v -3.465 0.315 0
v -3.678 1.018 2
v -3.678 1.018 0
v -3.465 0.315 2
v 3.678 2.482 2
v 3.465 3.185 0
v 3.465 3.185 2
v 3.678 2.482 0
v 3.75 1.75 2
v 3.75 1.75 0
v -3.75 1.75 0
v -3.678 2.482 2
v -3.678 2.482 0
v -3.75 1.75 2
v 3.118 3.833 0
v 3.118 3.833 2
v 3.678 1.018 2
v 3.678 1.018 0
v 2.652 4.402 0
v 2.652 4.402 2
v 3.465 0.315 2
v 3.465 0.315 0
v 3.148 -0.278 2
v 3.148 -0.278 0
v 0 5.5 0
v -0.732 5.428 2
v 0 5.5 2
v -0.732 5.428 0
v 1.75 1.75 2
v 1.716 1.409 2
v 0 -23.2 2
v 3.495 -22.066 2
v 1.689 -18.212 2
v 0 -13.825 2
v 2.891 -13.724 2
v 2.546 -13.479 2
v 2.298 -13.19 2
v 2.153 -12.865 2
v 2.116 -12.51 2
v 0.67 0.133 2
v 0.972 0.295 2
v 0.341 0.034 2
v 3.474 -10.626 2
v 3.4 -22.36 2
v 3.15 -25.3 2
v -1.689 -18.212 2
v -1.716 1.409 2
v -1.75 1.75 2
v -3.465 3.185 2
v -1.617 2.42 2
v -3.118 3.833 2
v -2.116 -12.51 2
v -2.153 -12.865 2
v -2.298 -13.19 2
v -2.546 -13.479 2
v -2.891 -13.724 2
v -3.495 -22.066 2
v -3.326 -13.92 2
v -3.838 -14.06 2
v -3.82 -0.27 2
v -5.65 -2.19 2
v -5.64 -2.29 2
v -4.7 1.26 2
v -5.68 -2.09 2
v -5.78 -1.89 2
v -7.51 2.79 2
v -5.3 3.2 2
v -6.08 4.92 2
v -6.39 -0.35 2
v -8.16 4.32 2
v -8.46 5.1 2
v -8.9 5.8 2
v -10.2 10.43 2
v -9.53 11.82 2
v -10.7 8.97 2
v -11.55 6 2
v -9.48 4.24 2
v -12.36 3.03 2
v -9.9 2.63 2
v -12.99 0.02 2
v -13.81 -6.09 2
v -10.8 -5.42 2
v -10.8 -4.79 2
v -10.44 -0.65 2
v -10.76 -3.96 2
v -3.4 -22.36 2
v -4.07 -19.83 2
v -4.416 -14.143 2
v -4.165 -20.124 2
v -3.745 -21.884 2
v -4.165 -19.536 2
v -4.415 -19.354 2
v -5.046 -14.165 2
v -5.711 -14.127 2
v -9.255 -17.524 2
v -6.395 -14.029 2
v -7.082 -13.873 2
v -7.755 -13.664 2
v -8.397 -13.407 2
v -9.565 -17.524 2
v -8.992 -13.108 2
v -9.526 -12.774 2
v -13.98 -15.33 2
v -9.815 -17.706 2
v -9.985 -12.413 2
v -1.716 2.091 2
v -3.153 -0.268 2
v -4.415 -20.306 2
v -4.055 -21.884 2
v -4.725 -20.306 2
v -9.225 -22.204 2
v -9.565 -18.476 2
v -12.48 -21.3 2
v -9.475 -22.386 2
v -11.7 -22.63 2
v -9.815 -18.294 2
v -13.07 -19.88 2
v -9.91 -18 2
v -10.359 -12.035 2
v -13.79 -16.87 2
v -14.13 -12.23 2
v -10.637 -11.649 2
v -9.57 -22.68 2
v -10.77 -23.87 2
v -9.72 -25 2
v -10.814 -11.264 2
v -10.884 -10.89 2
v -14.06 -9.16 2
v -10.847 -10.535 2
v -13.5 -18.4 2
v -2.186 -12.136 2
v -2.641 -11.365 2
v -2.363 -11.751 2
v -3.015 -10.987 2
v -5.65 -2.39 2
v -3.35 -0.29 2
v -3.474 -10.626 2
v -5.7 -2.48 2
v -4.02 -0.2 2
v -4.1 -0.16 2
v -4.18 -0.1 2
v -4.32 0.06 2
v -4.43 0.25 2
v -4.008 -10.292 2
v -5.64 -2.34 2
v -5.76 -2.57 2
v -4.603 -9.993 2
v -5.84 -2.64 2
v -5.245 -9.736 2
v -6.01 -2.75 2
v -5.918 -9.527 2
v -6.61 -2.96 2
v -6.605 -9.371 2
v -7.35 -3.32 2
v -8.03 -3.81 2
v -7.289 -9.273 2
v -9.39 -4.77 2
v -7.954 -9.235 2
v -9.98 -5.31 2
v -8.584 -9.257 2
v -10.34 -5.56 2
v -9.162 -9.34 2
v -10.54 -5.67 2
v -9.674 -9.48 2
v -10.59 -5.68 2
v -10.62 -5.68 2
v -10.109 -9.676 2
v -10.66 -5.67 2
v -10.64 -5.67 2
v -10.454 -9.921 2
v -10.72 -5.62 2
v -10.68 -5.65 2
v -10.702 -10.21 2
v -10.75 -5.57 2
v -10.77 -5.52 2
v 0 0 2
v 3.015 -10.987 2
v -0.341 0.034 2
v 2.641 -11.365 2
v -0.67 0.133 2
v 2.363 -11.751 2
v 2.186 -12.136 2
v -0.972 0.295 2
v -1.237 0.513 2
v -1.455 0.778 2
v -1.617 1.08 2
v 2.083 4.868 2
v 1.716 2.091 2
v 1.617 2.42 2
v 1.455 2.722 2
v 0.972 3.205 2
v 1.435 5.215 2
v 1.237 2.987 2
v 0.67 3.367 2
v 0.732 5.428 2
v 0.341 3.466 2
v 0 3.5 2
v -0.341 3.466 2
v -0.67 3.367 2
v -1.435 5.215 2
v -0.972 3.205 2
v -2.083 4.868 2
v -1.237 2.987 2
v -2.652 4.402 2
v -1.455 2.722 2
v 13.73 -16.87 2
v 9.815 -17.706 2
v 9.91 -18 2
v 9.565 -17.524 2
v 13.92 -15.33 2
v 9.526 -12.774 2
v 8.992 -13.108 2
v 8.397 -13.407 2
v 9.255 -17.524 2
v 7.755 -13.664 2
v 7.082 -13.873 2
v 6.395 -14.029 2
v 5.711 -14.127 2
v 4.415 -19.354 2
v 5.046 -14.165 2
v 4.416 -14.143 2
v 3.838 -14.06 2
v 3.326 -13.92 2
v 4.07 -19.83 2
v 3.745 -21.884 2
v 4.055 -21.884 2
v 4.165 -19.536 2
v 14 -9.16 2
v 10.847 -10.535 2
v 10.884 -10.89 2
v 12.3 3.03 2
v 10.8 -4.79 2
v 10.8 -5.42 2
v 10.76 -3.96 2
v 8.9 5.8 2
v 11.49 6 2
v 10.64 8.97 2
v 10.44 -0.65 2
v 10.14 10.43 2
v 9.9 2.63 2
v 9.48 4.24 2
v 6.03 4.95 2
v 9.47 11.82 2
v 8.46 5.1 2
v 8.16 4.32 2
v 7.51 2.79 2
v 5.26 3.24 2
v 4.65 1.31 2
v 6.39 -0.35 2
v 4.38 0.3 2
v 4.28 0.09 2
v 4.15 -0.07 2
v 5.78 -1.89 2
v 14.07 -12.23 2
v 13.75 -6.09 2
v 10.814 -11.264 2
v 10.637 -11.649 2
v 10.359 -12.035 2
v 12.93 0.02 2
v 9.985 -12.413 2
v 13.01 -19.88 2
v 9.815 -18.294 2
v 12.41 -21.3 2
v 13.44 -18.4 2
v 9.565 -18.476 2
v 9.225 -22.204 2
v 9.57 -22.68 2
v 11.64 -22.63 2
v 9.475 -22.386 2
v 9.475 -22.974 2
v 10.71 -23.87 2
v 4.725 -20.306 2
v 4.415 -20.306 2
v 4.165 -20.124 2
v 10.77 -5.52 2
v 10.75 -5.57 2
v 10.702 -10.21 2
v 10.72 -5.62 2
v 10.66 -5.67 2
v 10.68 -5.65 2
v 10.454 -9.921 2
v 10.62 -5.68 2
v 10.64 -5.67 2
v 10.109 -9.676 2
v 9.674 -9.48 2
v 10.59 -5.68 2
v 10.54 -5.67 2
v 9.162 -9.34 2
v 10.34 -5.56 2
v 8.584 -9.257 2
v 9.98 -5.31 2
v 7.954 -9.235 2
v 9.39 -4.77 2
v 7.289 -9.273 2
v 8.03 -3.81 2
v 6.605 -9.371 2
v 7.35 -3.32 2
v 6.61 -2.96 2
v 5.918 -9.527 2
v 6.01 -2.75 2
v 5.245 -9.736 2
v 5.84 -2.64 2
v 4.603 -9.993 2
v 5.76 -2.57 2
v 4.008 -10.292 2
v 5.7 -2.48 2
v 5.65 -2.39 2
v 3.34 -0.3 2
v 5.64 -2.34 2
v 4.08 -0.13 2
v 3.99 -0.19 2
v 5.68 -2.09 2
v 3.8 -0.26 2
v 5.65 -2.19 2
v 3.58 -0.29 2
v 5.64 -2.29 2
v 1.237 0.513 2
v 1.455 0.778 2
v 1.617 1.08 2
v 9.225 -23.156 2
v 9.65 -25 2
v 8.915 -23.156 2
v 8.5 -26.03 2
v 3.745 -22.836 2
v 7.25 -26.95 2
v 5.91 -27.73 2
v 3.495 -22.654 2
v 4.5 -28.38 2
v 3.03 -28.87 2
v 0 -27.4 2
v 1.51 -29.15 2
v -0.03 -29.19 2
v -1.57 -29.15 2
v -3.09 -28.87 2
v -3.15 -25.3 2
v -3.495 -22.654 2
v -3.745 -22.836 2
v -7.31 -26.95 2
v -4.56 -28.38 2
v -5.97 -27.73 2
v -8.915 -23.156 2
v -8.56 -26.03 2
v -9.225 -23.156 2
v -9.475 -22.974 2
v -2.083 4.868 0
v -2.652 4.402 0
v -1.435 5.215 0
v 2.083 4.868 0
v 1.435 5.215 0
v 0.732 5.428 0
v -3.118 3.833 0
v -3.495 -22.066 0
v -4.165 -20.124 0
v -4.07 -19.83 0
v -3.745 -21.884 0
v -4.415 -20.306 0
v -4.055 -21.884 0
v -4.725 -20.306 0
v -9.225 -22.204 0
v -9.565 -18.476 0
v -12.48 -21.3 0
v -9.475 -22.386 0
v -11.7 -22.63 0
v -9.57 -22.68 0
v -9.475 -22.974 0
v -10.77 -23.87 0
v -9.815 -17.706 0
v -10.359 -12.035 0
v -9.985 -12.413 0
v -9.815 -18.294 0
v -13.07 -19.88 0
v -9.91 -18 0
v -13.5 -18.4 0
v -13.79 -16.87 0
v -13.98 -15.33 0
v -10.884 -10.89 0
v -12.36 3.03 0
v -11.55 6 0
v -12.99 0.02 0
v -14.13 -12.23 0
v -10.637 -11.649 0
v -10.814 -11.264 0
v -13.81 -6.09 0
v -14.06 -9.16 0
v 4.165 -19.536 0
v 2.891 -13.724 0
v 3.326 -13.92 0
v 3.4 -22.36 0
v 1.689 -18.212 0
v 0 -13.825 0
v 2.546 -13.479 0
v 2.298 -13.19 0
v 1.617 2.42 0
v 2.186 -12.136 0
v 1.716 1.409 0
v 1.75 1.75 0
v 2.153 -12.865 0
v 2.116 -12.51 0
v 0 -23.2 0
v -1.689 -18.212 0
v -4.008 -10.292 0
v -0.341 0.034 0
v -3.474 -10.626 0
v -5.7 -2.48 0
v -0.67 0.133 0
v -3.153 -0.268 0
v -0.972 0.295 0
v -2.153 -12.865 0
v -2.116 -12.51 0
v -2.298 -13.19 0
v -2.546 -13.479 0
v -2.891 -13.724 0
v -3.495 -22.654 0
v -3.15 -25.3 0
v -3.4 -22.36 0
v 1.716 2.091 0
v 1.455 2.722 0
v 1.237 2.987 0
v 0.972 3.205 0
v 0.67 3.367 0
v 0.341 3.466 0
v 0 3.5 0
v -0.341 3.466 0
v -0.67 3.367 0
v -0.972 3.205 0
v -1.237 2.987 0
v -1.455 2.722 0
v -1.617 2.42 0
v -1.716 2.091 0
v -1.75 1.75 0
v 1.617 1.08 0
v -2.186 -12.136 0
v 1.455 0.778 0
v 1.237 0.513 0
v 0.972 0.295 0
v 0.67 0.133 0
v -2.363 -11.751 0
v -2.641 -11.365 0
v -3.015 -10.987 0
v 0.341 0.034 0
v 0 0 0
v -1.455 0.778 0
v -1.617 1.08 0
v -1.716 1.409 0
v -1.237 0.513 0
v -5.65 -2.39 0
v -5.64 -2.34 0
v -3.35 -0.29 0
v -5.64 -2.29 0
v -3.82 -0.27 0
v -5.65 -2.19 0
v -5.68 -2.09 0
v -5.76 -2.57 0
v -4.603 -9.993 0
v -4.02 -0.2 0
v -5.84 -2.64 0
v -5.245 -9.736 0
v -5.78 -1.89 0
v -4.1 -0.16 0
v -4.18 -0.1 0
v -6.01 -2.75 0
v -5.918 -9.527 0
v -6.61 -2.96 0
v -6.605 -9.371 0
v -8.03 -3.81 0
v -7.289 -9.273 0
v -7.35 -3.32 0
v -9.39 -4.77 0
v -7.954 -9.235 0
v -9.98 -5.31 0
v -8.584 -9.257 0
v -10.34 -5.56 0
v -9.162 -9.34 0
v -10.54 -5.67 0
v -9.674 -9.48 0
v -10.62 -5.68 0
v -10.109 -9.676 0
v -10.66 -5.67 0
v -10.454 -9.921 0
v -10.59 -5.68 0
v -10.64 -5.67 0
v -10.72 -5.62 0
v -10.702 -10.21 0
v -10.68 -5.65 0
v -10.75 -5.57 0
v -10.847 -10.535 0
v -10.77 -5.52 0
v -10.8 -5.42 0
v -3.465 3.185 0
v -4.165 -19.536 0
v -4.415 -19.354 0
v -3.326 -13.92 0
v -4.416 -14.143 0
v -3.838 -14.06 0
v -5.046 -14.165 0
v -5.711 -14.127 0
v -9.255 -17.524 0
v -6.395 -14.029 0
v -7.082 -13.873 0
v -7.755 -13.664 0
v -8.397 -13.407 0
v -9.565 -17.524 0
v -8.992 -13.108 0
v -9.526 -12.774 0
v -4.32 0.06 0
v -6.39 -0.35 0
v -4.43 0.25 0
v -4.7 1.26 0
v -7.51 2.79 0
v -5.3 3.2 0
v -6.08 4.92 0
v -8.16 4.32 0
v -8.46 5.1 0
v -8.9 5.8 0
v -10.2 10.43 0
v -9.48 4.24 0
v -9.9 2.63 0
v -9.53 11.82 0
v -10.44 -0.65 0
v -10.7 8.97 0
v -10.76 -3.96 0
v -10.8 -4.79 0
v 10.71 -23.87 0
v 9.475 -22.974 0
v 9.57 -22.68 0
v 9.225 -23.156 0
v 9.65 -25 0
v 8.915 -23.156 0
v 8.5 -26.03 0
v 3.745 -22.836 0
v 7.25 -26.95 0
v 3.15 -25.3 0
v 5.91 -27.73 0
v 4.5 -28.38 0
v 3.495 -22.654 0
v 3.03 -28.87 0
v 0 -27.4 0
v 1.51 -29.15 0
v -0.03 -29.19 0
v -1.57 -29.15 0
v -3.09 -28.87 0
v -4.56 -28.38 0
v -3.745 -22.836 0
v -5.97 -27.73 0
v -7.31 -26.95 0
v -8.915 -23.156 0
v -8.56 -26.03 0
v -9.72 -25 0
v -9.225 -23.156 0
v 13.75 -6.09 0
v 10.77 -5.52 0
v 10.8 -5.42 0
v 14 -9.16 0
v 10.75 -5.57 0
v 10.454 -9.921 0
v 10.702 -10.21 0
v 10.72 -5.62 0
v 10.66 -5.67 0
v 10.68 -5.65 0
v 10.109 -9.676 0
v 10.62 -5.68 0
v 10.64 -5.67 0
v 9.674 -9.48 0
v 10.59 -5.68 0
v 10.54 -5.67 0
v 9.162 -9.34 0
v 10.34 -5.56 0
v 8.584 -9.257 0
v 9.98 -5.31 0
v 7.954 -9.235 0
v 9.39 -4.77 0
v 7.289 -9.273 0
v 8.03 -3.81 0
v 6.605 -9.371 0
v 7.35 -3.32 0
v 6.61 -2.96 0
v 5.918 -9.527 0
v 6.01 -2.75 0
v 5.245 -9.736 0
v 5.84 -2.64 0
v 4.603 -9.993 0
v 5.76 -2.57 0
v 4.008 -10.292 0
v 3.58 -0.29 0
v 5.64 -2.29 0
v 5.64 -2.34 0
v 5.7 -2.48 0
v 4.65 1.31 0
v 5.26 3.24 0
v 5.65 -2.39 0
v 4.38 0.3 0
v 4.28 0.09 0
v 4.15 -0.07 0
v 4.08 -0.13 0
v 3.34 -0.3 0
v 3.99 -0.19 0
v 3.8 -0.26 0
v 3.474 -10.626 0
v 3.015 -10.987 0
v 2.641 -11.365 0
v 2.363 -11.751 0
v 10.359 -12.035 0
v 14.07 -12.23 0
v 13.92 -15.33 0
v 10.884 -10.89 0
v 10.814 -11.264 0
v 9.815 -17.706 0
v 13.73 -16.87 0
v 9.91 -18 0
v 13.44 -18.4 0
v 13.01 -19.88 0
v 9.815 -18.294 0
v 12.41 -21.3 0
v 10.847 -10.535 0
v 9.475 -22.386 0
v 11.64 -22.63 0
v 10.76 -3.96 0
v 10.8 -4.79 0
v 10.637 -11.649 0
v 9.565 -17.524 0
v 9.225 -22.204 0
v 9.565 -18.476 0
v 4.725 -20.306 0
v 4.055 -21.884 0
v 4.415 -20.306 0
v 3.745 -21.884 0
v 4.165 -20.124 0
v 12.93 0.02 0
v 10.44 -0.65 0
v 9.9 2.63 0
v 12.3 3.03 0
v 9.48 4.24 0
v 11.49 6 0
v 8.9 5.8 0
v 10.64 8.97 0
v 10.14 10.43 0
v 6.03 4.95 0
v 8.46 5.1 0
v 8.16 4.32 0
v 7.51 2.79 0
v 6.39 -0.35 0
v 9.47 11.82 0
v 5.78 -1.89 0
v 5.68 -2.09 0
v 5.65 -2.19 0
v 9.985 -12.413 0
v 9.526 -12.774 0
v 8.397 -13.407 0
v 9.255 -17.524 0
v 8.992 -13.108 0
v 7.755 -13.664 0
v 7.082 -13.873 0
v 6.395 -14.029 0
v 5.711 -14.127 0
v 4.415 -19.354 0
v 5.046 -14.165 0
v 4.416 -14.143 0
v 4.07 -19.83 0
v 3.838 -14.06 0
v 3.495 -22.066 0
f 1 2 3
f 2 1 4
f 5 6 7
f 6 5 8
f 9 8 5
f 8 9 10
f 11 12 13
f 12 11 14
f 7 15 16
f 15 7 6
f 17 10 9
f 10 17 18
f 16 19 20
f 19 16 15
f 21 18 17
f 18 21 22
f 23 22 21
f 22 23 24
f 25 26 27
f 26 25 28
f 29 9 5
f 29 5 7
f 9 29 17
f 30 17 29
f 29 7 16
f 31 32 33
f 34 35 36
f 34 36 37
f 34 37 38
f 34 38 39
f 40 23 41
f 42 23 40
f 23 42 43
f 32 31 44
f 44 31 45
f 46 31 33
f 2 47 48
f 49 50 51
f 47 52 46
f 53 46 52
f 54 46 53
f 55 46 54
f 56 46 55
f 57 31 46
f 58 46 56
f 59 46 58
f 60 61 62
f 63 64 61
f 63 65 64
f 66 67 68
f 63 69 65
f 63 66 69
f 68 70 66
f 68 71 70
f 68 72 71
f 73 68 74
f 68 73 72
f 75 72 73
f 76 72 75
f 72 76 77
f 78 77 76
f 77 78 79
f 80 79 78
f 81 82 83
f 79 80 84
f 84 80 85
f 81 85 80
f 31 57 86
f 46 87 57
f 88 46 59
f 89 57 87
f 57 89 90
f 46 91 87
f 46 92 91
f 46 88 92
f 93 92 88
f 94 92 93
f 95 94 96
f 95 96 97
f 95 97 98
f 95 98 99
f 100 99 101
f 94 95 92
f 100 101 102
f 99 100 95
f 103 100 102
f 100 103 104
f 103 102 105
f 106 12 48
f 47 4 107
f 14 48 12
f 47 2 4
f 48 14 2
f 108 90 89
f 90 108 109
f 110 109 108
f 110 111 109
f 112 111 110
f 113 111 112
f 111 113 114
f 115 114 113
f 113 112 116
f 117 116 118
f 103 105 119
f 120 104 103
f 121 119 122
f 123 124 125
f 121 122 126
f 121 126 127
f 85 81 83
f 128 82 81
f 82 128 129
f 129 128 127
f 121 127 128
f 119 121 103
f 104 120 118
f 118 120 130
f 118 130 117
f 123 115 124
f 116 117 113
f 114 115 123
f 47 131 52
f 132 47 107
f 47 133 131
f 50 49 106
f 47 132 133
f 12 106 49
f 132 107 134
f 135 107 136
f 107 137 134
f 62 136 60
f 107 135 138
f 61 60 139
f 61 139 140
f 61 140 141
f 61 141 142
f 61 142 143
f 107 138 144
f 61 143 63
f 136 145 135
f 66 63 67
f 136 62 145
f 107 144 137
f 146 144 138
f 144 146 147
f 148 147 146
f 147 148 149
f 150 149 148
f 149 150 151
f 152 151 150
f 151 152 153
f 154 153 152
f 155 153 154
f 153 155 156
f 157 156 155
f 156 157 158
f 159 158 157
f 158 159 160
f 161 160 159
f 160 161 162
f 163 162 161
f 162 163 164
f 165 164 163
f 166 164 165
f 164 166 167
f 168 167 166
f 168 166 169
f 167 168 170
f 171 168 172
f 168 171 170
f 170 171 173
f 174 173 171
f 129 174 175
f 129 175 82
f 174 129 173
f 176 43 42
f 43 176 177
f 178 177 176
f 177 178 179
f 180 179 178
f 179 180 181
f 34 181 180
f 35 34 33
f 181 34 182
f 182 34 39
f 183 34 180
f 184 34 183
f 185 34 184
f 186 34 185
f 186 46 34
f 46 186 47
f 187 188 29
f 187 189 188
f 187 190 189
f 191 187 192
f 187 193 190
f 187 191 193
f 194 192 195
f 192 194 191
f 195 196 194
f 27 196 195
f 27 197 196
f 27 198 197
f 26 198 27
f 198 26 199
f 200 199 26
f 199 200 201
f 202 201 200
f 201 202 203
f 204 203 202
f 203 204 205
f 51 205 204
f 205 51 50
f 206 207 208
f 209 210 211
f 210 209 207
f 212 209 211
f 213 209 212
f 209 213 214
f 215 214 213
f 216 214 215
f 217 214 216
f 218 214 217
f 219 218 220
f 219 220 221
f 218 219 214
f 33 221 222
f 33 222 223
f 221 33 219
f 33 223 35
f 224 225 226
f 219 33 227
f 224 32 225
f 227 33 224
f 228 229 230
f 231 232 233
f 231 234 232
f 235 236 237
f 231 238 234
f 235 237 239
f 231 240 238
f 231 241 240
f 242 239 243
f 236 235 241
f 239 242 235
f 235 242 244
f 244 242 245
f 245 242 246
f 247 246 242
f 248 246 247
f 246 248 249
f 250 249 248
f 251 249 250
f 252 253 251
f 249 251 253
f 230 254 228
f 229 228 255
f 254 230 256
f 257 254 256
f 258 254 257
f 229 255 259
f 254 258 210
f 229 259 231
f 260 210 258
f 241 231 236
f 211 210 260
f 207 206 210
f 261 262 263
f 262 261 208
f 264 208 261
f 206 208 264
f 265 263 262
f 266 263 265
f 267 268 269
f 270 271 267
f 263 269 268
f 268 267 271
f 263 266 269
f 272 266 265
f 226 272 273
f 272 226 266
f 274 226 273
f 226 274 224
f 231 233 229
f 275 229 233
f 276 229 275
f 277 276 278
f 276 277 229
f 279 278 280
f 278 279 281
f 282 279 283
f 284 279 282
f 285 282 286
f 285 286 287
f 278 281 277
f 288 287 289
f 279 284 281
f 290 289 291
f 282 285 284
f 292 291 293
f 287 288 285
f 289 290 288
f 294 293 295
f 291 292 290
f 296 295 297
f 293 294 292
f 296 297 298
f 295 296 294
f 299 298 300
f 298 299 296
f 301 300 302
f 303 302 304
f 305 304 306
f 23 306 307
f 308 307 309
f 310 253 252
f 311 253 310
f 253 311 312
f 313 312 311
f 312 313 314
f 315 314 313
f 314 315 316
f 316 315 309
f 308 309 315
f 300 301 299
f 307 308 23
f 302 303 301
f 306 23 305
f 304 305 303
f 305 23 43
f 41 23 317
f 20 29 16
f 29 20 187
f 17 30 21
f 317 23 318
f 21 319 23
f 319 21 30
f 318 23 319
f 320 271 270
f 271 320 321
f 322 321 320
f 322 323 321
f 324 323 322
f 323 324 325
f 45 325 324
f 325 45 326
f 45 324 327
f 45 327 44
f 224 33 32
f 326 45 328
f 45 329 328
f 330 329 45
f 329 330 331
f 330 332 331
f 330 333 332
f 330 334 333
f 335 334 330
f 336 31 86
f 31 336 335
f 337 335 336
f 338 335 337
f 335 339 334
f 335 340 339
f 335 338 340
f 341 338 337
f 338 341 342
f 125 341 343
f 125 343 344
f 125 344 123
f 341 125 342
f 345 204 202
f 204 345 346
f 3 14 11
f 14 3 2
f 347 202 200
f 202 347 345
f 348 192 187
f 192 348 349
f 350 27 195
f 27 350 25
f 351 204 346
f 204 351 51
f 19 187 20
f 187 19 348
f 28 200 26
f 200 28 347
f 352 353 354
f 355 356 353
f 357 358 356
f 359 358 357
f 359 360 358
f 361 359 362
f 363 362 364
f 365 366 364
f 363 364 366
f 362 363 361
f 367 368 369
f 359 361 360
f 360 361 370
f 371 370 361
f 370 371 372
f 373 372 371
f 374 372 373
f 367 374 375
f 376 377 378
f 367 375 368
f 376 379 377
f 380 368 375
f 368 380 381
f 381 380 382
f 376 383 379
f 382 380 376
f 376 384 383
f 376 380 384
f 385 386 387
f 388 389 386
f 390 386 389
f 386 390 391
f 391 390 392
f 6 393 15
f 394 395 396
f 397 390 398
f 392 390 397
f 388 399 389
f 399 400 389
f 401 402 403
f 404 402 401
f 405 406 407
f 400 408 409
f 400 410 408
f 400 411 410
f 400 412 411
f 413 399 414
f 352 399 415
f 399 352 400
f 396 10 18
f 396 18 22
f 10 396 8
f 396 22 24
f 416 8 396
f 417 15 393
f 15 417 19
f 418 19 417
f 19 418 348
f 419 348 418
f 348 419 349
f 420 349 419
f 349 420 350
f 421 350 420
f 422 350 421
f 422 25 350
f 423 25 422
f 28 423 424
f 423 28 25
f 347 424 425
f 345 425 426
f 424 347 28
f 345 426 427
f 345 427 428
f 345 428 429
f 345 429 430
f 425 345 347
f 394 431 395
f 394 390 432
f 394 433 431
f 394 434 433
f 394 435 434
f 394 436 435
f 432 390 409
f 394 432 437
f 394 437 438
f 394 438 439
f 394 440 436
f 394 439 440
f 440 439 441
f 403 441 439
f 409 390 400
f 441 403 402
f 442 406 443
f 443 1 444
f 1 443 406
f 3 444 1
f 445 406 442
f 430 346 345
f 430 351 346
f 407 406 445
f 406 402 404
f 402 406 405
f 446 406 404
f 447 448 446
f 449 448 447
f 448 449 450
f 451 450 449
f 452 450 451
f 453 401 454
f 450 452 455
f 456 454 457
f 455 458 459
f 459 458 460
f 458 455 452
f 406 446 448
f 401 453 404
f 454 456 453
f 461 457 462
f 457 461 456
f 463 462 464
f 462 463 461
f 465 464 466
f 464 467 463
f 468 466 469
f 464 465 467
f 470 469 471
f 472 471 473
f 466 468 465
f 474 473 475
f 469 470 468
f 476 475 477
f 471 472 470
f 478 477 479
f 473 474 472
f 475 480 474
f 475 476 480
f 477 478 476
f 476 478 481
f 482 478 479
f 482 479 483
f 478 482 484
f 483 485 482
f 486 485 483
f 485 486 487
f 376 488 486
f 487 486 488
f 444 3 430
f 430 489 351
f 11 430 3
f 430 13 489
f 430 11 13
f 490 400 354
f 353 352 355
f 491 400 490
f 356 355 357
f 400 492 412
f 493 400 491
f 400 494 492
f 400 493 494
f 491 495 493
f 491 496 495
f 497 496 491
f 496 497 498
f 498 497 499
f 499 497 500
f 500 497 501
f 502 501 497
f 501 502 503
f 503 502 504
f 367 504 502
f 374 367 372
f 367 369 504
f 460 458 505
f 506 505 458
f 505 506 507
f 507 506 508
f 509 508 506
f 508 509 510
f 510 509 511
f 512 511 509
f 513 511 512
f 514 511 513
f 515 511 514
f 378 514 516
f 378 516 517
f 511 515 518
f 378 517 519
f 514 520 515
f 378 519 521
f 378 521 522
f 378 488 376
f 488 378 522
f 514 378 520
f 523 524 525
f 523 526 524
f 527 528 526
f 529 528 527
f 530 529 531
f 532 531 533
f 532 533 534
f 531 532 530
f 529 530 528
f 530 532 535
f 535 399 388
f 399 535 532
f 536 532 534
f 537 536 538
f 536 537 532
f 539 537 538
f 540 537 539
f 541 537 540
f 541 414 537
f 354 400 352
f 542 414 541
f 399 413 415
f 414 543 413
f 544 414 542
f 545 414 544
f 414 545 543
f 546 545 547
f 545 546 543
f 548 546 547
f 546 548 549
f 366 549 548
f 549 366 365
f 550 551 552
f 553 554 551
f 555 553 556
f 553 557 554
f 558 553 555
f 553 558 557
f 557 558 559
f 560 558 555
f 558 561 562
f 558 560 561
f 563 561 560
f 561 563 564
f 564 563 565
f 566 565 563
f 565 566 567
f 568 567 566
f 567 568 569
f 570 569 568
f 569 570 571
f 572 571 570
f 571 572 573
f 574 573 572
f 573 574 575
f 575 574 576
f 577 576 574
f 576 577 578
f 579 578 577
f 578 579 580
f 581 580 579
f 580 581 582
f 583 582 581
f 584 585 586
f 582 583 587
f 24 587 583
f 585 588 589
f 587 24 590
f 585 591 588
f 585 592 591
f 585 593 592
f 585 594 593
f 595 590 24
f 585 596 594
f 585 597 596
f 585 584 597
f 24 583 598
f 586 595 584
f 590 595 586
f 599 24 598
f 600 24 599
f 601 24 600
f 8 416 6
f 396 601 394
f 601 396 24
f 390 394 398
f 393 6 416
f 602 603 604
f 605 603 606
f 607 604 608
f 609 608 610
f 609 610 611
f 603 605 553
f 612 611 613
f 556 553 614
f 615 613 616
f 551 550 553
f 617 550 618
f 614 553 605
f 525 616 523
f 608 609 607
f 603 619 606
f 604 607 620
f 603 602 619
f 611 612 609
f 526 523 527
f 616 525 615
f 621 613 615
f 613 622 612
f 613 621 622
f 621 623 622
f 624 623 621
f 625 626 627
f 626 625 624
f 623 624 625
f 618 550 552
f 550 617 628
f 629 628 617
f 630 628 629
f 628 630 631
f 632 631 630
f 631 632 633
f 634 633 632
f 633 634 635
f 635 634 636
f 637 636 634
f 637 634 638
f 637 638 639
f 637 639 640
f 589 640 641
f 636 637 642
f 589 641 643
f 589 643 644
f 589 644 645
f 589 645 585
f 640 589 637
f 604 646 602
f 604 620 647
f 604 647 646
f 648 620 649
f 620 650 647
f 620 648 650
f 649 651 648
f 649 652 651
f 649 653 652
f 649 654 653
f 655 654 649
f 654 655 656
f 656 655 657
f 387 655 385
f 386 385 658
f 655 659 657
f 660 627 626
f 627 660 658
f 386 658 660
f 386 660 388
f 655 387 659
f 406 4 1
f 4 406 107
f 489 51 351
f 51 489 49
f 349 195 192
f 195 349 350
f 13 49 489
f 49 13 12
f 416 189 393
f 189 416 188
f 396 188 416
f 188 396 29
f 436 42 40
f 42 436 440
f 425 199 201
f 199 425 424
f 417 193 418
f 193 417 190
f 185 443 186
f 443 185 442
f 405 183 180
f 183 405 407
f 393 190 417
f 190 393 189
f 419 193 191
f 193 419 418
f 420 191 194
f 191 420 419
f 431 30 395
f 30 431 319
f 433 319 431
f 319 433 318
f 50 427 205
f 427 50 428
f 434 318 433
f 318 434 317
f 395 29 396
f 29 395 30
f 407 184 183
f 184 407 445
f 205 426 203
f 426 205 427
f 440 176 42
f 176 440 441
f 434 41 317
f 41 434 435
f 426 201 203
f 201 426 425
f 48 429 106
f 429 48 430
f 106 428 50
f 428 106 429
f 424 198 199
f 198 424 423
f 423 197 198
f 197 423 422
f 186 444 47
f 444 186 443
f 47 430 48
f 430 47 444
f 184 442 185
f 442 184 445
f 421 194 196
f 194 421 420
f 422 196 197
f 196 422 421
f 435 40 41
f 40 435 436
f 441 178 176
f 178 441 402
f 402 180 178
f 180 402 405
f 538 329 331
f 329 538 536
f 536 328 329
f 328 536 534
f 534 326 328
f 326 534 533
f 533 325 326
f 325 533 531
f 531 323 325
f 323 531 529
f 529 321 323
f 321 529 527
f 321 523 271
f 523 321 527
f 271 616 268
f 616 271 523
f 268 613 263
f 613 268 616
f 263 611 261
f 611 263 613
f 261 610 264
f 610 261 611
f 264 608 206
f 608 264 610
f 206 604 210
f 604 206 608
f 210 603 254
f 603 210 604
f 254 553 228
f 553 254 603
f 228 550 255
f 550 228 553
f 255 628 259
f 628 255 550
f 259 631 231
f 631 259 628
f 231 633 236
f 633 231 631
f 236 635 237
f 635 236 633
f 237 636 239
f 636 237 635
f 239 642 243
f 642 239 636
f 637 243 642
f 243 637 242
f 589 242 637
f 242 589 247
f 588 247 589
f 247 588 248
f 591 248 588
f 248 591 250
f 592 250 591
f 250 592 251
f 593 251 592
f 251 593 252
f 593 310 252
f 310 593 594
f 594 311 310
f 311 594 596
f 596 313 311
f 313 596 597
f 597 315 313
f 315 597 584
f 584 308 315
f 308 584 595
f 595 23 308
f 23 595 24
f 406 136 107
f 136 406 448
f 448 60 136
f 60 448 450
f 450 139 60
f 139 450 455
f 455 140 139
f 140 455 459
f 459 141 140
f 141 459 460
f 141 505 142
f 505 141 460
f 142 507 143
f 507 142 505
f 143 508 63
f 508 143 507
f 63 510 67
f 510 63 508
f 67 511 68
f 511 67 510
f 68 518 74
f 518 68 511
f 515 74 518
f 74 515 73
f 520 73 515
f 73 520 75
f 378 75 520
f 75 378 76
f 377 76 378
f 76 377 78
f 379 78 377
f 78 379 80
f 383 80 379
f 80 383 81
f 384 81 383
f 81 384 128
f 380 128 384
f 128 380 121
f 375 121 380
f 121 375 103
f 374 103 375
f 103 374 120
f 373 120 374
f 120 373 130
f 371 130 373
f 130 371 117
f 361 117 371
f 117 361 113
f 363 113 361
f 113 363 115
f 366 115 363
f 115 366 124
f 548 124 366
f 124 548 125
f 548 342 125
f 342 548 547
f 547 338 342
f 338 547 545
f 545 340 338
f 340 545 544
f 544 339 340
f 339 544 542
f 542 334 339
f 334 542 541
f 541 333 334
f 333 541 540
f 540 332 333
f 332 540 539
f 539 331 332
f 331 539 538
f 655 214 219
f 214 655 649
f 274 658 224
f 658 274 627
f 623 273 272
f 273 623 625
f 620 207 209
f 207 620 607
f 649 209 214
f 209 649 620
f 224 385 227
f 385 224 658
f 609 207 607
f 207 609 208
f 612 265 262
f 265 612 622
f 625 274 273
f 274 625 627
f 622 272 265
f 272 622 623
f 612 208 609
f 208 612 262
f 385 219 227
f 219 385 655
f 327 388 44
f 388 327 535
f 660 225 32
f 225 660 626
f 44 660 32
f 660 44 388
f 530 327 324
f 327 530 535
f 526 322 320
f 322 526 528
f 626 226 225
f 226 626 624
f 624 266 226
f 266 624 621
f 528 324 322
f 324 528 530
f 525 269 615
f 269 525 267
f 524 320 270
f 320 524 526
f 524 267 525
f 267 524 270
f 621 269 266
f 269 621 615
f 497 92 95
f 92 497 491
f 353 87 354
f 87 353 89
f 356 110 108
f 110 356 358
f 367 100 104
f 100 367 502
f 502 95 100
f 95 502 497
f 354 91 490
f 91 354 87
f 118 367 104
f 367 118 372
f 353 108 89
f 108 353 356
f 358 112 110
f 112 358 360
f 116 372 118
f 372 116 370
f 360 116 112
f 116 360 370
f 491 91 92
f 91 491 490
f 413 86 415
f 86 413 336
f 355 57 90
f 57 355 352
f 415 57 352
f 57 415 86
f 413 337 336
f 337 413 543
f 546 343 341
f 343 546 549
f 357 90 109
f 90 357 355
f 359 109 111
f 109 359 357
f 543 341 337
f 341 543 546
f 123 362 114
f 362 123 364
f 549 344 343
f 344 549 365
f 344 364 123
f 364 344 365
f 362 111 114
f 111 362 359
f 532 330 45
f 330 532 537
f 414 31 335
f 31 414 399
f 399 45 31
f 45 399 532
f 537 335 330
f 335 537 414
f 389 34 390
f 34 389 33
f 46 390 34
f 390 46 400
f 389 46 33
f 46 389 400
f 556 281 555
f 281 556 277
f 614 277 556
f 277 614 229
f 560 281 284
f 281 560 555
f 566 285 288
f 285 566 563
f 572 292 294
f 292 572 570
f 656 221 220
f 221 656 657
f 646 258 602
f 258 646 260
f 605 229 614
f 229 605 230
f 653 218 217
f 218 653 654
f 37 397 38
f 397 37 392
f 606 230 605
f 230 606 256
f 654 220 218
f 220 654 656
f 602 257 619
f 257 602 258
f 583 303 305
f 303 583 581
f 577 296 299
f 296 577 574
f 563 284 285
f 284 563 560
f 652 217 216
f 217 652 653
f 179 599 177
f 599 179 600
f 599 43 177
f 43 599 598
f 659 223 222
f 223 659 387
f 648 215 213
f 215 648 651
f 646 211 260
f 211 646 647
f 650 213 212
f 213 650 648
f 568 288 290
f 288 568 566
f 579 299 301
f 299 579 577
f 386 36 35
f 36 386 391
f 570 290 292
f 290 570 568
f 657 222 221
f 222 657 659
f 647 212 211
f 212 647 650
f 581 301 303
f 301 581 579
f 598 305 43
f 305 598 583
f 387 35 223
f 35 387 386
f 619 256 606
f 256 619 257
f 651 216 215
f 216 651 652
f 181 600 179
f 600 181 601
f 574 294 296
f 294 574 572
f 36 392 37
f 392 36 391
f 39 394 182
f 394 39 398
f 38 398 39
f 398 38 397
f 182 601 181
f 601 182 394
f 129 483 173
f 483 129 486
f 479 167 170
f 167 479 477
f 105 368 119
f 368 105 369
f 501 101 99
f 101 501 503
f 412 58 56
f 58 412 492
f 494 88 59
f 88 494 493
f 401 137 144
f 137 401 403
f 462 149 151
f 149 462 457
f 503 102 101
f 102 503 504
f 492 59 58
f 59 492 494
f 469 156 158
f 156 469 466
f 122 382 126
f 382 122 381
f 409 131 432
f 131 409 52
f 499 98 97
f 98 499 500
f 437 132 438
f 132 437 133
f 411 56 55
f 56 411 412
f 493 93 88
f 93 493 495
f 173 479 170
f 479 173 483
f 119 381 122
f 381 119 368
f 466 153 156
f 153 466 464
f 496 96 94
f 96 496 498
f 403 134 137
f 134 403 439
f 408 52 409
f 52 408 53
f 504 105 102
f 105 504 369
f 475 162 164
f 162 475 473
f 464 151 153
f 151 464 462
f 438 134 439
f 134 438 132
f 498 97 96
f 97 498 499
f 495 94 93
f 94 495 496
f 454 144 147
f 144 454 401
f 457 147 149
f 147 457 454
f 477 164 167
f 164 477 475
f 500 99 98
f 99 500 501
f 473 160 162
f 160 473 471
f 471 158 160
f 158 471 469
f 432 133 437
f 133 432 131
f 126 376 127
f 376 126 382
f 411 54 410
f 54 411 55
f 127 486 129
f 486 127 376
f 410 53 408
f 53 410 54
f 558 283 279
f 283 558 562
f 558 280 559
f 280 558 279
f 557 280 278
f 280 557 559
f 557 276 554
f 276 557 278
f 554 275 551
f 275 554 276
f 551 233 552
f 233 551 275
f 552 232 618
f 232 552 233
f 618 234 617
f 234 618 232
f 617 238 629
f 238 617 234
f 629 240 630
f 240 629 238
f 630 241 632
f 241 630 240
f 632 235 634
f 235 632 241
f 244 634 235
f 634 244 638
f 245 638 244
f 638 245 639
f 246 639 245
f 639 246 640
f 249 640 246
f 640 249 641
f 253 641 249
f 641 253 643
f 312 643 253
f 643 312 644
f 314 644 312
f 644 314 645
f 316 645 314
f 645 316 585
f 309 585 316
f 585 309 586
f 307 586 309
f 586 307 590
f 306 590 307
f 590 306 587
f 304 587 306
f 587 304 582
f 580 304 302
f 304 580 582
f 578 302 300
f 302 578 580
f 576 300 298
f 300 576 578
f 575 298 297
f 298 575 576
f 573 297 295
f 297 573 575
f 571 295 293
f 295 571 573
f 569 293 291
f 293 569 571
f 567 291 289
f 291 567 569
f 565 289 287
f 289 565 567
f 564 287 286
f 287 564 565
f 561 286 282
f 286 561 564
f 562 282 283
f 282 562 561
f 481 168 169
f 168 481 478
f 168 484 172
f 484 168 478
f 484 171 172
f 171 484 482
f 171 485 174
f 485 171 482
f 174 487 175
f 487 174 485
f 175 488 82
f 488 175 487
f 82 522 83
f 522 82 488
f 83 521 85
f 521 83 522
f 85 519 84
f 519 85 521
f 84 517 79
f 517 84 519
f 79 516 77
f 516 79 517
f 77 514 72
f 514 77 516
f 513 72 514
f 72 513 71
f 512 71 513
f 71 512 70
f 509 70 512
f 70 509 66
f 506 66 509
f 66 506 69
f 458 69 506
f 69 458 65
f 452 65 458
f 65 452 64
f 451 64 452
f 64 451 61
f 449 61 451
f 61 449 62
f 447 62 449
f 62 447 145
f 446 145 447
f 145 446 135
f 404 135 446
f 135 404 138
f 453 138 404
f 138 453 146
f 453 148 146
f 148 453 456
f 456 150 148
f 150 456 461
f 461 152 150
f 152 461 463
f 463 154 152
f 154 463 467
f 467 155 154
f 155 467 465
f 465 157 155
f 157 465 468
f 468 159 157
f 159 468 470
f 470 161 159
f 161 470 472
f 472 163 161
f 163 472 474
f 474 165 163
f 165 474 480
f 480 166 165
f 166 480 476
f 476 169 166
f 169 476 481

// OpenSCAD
//Customizable Remix of Key-kitty Key Ring
//9/1/2016  By: David Bunch
//Remixed from: http://www.thingiverse.com/thing:51350
//
//1. Height of Key Ring (3.5 Original)
Ht = 2;             //[.2:.2:5]

//2. Diameter of Key Ring Hole (2.87 Original)
Hole_ID = 3.5;      //[2.5:.25:6]

//3. Thickness around Key Ring Hole (1.07 Original)
Thk = 2.0;          //[1:.2:3]

//4. Add Text to Key Ring
AddText = "no";        //[yes,no]

//5. Text to Add to Key Ring
Name = "Cat";       //Text to Add

//6. Text Height to use
Ft_Size = 5;        //[3:.2:7]

//7. Font
Ft_Name = "Liberation Sans";    //[Liberation Mono, Liberation Sans, Liberation Sans Narrow,Liberation Serif]

//8. Font Style
Ft_Style = "Bold";           //[Narrow, Narrow Italic, Narrow Bold, Italic, Bold, Bold Italic]

//9. Thickness of Text above Key Ring
Text_Ht = .5;       //[.2:.1:2]

//10. Text Y Offset
Text_Y_Offset = 8;         //[4:.2:12]

//11. Character Spacing
Text_Spacing = 1; //[.5:.1:2]

/* [Hidden] */
//Diameter of Eyes (8.94 Original)
Eye_OD = 9;         //[5:.5:12]

//Scale of Eyes in Y-axis to make oval
Eye_Scale_Y = .5;   //[.2:.05:1]

//Rotation of Oval Eyes
Eye_Rot = 15;       //[0:1:30]
Whisker_OD = 1;     //[.7:.1:2] (.77 Original)
Whisker_Res = 10;   //Originally 24;

Ft_Type = str(Ft_Name,":style=",Ft_Style);              //Create complete Font Style

Hole_OD = Hole_ID + (2 * Thk);      //Outer Diameter of Key Ring Hole
Hole_Rad = Hole_ID / 2;
Hole_OD_Res = (round(((Hole_OD * 3.14)/4) / .7)*4);     //About .7mm segments
Eye_OD_Res = (round(((Eye_OD * 3.14)/4) / .7)*4);       //Resolution of Eyes, about .7mm segments
echo(Hole_OD_Res = Hole_OD_Res);
echo(Eye_OD_Res = Eye_OD_Res);

echo(Ft_Type = Ft_Type);
module CatOutline()
{
    union()
    {
        color("cyan")
        {
            linear_extrude(height = Ht, center = false, convexity = 10)polygon(points = 
            [[-2.82,-0.23],[-3.35,-0.29],[-3.82,-0.27],[-4.02,-0.2],[-4.1,-0.16],
            [-4.18,-0.1],[-4.32,0.06],[-4.43,0.25],[-4.7,1.26],[-5.3,3.2],
            [-6.08,4.92],[-9.53,11.82],[-10.2,10.43],[-10.7,8.97],[-11.55,6],
            [-12.36,3.03],[-12.99,0.02],[-13.81,-6.09],[-14.06,-9.16],[-14.13,-12.23],
            [-13.98,-15.33],[-13.79,-16.87],[-13.5,-18.4],[-13.07,-19.88],[-12.48,-21.3],
            [-11.7,-22.63],[-10.77,-23.87],[-9.72,-25],[-8.56,-26.03],[-7.31,-26.95],
            [-5.97,-27.73],[-4.56,-28.38],[-3.09,-28.87],[-1.57,-29.15],[-0.03,-29.19],
            [1.51,-29.15],[3.03,-28.87],[4.5,-28.38],[5.91,-27.73],[7.25,-26.95],
            [8.5,-26.03],[9.65,-25],[10.71,-23.87],[11.64,-22.63],[12.41,-21.3],
            [13.01,-19.88],[13.44,-18.4],[13.73,-16.87],[13.92,-15.33],[14.07,-12.23],
            [14,-9.16],[13.75,-6.09],[12.93,0.02],[12.3,3.03],[11.49,6],
            [10.64,8.97],[10.14,10.43],[9.47,11.82],[6.03,4.95],[5.26,3.24],
            [4.65,1.31],[4.38,0.3],[4.28,0.09],[4.15,-0.07],[4.08,-0.13],
            [3.99,-0.19],[3.8,-0.26],[3.58,-0.29],[3.34,-0.3],[2.82,-0.24],
            [1.89,-0.11],[0.95,-0.03],[0,0],[-0.95,-0.03],[-1.89,-0.1],
            [-2.82,-0.23]]);
            translate([0,Hole_Rad,0])
            {
                difference()
                {
                    cylinder(d=Hole_OD,h=Ht,$fn=Hole_OD_Res);
                    translate([0,0,-1])
                    cylinder(d=Hole_ID,h=Ht+2,$fn=Hole_OD_Res);
                }
            }
        }
        if (AddText == "yes")
        {
            translate([0,-Text_Y_Offset,Ht-.1])
            color("red")
            linear_extrude(height = Text_Ht + .1) {
            {
                text(Name, size = Ft_Size, halign = "center",spacing = Text_Spacing, font = Ft_Type);
            }
        }
        }
    }
}
module Ear()
{
    translate([0,0,-1])
    linear_extrude(height = Ht+2, center = false, convexity = 10)polygon(points = 
    [[8.9,5.8],[8.46,5.1],[8.16,4.32],[7.51,2.79],[6.39,-0.35],
    [5.78,-1.89],[5.68,-2.09],[5.65,-2.19],[5.64,-2.29],[5.64,-2.34],
    [5.65,-2.39],[5.7,-2.48],[5.76,-2.57],[5.84,-2.64],[6.01,-2.75],
    [6.21,-2.82],[6.61,-2.96],[7.35,-3.32],[8.03,-3.81],[9.39,-4.77],
    [9.98,-5.31],[10.34,-5.56],[10.54,-5.67],[10.59,-5.68],[10.62,-5.68],
    [10.64,-5.67],[10.66,-5.67],[10.68,-5.65],[10.72,-5.62],[10.75,-5.57],
    [10.77,-5.52],[10.8,-5.42],[10.8,-5.21],[10.8,-4.79],[10.76,-3.96],
    [10.44,-0.65],[9.9,2.63],[9.48,4.24]]);
}
module Whiskers()
{
//Top Whisker to the Right
    hull()
    {
        translate([4.57,-19.83,-1])
        cylinder(d=Whisker_OD,h=Ht+2,$fn=Whisker_Res);
        translate([9.41,-18,-1])
        cylinder(d=Whisker_OD,h=Ht+2,$fn=Whisker_Res);
    }
//Bottom Whisker to the Right
    hull()
    {
        translate([3.9,-22.36,-1])
        cylinder(d=Whisker_OD,h=Ht+2,$fn=Whisker_Res);
        translate([9.07,-22.68,-1])
        cylinder(d=Whisker_OD,h=Ht+2,$fn=Whisker_Res);
    }
}
module Eye()
{
    translate([6.5,-11.7,-1])
    rotate([0,0,Eye_Rot])                           //Rotate a little
    scale([1,Eye_Scale_Y,1])                        //Make eye thinner in the vertical
    cylinder(d=Eye_OD,h=Ht+2,$fn=Eye_OD_Res);       //Right Eye
}
difference()
{
    CatOutline();

    Whiskers();                         //Right Whiskers
    mirror([1,0,0])
    Whiskers();                         //Left Whiskers

    translate([0,-25.3,-1])
    scale([1.5,1,1])
    cylinder(d=4.2,h=Ht+2,$fn=4);       //Mouth 

    translate([0,-16.75,-1])
    scale([1,1.5,1])
    rotate([0,0,90])
    cylinder(d=3.9,h=Ht+2,$fn=3);       //Nose

    Eye();                              //Right Eye
    mirror([1,0,0])
    Eye();                              //Left Eye

    Ear();                              //Right Ear
    mirror([1,0,0])
    Ear();                              //Left Ear
}
